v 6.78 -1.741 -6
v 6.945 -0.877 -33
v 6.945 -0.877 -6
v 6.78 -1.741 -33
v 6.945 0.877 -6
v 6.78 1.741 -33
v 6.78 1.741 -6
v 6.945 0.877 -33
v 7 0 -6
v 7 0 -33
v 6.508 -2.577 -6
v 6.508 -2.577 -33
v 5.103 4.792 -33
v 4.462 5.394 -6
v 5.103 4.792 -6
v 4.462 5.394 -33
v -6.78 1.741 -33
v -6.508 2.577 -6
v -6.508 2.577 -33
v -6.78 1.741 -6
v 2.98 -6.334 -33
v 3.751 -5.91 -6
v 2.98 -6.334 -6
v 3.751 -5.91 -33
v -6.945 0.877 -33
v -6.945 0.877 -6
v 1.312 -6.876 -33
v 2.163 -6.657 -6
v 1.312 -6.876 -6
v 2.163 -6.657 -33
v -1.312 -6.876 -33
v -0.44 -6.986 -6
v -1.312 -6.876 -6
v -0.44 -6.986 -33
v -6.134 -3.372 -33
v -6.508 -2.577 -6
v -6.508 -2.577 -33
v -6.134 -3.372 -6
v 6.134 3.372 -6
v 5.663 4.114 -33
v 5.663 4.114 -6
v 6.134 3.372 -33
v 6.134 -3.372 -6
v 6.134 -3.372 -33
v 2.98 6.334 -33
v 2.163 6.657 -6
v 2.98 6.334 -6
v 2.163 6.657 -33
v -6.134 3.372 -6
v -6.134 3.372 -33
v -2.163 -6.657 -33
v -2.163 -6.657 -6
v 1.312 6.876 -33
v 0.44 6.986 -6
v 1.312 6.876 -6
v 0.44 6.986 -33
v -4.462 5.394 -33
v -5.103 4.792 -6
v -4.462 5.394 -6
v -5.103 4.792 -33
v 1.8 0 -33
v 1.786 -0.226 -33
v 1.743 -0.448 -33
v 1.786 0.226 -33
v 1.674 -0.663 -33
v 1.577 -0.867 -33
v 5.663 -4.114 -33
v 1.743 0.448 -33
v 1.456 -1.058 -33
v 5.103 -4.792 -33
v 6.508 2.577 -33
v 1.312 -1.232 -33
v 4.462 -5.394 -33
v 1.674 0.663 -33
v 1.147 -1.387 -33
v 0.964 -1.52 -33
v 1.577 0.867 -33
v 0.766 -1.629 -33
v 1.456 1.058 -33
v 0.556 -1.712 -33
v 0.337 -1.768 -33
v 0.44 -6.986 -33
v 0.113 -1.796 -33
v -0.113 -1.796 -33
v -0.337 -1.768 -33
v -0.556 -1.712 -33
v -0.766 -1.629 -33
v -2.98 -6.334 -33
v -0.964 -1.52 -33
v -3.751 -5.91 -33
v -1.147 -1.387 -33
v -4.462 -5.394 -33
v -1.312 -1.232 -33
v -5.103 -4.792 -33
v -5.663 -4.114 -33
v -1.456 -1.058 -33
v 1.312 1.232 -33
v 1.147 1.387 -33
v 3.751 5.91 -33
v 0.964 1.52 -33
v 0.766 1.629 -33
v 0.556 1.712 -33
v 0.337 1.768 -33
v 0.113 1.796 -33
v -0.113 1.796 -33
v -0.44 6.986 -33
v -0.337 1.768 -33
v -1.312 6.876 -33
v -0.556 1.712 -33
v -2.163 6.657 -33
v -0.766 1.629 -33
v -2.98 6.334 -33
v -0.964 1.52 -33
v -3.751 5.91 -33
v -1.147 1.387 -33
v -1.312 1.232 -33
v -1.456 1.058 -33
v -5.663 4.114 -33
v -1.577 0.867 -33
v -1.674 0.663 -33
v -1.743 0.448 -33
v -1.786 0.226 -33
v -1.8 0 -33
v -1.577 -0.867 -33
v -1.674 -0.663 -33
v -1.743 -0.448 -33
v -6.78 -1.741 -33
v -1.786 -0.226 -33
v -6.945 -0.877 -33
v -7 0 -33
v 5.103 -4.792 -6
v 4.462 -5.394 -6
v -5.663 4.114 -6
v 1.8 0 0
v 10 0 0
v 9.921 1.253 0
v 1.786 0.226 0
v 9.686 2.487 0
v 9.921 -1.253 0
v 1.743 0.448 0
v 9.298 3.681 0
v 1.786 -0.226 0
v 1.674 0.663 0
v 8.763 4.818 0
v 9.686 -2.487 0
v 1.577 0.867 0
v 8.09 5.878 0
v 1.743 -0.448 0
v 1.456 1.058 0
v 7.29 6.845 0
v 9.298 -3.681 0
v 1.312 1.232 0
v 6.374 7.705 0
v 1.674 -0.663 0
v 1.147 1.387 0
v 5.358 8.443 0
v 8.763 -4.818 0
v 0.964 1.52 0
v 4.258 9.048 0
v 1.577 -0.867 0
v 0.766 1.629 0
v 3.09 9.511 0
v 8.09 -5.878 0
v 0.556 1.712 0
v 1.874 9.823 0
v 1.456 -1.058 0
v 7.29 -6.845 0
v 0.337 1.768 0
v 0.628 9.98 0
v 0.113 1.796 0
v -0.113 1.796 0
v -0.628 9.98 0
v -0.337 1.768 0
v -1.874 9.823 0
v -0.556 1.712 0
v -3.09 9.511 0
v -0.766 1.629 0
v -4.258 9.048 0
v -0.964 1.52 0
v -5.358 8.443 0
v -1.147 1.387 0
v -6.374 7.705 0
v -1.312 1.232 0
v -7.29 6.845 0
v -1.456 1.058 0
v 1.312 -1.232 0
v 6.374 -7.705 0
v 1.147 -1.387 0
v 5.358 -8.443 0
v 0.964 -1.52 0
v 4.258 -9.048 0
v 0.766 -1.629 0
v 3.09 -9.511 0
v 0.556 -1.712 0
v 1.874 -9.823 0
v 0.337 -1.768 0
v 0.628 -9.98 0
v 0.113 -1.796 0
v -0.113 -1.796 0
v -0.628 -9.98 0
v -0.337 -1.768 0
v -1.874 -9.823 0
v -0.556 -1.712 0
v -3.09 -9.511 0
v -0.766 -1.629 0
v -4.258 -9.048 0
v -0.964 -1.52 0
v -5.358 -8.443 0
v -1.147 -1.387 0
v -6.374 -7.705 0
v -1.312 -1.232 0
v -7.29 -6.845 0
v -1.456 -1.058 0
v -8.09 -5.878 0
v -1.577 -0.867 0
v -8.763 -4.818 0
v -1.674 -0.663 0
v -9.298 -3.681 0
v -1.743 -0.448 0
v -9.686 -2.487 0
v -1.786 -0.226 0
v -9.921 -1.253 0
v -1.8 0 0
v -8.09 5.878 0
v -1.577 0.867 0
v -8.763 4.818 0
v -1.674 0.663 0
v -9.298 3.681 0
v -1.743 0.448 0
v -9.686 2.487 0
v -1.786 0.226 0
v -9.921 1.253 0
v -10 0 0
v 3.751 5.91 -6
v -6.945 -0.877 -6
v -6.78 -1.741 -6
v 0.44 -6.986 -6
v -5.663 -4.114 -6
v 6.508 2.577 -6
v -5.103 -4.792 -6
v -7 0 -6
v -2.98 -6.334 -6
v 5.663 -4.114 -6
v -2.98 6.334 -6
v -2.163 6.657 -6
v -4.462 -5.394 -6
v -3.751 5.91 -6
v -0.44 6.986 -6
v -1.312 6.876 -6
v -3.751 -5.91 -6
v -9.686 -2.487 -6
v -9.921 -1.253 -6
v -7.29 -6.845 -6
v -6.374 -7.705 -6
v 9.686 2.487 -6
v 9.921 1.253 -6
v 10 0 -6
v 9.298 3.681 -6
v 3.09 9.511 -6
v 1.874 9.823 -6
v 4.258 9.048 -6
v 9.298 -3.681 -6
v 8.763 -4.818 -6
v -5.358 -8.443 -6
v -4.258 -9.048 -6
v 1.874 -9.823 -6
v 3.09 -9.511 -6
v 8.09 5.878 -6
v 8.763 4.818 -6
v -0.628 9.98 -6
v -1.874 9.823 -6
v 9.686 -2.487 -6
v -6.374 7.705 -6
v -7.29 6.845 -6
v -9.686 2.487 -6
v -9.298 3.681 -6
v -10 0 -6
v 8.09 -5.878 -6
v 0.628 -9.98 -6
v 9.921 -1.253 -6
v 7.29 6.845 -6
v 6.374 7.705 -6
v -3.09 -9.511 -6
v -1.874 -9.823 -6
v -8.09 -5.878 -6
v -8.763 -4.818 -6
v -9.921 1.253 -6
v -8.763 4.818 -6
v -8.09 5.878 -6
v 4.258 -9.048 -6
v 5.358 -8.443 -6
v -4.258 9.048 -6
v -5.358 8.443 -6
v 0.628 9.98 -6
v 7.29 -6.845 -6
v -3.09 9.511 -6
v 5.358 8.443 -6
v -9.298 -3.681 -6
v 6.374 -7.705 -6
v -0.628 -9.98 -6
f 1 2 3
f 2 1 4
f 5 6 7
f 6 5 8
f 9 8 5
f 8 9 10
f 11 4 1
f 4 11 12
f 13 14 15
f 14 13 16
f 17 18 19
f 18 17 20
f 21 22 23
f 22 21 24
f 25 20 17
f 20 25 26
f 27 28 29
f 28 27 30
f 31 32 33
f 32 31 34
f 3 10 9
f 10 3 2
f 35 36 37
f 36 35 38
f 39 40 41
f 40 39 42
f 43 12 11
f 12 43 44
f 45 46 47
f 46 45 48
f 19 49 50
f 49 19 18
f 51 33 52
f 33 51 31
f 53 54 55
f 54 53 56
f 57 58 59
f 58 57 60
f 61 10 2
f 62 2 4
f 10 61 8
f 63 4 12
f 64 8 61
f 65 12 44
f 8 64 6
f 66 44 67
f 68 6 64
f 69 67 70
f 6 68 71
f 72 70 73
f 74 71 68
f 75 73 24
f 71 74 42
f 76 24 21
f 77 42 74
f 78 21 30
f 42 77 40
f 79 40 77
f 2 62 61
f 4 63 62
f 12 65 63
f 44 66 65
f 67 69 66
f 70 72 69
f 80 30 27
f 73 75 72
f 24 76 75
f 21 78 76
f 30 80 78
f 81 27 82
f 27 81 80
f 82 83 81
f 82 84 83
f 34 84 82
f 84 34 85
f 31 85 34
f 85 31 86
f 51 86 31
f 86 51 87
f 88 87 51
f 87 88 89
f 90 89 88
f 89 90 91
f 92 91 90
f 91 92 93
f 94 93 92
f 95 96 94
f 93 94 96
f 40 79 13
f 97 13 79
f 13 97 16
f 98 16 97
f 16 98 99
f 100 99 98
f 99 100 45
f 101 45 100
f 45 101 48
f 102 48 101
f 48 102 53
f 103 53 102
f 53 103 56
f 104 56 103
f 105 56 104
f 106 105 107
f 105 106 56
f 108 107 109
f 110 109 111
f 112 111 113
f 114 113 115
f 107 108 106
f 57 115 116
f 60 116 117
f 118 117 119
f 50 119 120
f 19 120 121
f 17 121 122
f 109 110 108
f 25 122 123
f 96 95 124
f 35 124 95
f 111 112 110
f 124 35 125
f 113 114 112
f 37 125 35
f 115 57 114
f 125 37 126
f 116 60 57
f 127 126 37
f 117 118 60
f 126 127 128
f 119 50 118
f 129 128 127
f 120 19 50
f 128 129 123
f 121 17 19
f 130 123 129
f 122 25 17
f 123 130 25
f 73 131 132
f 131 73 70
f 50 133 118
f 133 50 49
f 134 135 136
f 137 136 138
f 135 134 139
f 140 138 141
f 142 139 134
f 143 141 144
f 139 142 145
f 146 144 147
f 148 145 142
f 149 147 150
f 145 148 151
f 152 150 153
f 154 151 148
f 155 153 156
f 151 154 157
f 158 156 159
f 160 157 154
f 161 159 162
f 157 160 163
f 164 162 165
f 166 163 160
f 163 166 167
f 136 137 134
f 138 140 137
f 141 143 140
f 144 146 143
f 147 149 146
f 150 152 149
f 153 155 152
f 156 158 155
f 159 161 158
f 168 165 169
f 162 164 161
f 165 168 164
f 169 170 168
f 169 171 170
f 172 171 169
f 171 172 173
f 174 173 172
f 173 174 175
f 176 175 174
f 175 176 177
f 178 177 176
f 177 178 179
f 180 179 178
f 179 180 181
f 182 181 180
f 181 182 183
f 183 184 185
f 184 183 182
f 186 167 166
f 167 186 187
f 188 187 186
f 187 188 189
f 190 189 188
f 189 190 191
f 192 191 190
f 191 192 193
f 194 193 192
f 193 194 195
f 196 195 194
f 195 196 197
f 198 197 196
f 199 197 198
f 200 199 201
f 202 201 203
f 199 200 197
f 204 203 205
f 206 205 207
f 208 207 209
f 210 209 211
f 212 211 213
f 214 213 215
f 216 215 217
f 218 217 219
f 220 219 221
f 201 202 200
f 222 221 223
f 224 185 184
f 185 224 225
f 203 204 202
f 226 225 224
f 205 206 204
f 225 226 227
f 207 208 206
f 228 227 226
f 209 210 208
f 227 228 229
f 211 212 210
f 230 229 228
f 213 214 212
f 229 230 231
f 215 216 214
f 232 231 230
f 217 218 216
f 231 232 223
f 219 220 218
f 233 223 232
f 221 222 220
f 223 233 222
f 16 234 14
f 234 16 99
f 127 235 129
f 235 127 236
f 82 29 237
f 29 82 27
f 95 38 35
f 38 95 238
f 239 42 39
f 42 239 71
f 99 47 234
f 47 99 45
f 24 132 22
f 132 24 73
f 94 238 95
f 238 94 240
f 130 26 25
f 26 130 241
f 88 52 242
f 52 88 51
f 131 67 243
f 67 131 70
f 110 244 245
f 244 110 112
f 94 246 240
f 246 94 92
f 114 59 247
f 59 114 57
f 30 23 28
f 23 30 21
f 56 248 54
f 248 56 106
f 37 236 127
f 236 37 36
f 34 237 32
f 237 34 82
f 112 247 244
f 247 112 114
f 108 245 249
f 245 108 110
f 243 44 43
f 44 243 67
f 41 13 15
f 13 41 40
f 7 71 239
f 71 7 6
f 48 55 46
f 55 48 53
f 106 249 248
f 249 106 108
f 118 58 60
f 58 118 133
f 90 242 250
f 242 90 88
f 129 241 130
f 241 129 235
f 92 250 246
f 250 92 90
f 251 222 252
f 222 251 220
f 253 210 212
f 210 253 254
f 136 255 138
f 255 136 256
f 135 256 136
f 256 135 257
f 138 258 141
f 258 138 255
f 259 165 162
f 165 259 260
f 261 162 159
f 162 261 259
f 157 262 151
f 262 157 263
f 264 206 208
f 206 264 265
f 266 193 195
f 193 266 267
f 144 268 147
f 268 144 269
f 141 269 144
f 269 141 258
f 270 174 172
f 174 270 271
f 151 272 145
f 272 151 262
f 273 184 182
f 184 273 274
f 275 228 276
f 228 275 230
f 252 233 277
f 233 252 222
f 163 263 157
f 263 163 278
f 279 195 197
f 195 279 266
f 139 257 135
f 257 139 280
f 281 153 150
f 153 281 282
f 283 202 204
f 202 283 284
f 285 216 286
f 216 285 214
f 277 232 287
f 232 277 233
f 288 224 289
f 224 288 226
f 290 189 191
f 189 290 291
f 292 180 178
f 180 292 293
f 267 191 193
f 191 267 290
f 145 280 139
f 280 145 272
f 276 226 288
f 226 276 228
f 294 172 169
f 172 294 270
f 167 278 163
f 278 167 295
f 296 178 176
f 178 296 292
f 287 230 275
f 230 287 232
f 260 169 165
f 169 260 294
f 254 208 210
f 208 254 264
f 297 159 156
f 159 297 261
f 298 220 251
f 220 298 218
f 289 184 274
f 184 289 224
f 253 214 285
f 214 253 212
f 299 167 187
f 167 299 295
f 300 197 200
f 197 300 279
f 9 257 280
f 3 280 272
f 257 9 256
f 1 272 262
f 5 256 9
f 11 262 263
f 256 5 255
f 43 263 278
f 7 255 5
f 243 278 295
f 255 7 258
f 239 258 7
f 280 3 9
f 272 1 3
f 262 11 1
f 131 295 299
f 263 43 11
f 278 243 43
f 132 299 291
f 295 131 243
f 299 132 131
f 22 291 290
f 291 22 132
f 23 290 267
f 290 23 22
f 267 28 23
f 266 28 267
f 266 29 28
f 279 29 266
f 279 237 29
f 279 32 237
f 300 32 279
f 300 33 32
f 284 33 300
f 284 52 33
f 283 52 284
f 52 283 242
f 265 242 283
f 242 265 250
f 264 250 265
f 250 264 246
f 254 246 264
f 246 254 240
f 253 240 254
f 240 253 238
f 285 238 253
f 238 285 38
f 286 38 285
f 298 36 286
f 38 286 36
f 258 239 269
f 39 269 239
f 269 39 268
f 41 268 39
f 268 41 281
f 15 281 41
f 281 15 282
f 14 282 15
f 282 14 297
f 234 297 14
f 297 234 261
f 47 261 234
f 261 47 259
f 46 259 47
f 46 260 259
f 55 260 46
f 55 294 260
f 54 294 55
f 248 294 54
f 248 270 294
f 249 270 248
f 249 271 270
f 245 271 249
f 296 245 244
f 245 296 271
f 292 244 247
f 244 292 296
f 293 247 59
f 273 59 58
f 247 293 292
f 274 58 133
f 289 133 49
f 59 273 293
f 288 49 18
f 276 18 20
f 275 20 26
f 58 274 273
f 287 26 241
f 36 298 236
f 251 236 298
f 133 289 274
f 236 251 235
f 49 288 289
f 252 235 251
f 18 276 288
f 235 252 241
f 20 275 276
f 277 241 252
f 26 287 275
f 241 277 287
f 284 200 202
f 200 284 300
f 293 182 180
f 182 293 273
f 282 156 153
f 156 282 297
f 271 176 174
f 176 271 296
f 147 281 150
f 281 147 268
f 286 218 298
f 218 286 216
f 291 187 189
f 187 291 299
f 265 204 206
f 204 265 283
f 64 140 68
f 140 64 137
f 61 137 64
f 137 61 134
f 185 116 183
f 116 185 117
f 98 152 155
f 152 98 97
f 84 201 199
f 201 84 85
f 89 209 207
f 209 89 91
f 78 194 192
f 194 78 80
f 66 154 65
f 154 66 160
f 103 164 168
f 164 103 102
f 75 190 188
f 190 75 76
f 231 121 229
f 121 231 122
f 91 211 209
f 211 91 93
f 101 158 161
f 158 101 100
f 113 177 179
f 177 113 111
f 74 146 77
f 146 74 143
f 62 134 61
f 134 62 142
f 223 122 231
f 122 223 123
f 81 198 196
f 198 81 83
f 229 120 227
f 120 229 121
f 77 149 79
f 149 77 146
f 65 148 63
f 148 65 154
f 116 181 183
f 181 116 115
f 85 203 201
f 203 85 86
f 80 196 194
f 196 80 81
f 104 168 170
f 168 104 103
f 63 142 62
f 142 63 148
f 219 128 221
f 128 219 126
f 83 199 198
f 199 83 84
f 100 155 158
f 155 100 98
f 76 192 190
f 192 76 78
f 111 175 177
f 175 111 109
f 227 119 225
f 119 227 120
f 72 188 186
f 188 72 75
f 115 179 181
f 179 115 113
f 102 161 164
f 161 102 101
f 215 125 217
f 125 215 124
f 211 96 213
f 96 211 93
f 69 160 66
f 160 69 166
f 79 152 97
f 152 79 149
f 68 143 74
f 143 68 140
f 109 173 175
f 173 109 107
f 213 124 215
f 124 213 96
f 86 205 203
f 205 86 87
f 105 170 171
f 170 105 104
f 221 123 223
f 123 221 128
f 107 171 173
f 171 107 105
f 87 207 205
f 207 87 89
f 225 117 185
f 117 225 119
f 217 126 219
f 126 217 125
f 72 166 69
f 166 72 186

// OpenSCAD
$fn = 50;


difference() {
	union() {
		translate(v = [0, 0, -33.0000000000]) {
			cylinder(h = 33, r = 7.0000000000);
		}
		translate(v = [0, 0, -6.0000000000]) {
			cylinder(h = 6, r = 10.0000000000);
		}
	}
	union() {
		#translate(v = [0, 0, -33]) {
			cylinder(h = 33, r = 1.8000000000);
		}
	}
}
